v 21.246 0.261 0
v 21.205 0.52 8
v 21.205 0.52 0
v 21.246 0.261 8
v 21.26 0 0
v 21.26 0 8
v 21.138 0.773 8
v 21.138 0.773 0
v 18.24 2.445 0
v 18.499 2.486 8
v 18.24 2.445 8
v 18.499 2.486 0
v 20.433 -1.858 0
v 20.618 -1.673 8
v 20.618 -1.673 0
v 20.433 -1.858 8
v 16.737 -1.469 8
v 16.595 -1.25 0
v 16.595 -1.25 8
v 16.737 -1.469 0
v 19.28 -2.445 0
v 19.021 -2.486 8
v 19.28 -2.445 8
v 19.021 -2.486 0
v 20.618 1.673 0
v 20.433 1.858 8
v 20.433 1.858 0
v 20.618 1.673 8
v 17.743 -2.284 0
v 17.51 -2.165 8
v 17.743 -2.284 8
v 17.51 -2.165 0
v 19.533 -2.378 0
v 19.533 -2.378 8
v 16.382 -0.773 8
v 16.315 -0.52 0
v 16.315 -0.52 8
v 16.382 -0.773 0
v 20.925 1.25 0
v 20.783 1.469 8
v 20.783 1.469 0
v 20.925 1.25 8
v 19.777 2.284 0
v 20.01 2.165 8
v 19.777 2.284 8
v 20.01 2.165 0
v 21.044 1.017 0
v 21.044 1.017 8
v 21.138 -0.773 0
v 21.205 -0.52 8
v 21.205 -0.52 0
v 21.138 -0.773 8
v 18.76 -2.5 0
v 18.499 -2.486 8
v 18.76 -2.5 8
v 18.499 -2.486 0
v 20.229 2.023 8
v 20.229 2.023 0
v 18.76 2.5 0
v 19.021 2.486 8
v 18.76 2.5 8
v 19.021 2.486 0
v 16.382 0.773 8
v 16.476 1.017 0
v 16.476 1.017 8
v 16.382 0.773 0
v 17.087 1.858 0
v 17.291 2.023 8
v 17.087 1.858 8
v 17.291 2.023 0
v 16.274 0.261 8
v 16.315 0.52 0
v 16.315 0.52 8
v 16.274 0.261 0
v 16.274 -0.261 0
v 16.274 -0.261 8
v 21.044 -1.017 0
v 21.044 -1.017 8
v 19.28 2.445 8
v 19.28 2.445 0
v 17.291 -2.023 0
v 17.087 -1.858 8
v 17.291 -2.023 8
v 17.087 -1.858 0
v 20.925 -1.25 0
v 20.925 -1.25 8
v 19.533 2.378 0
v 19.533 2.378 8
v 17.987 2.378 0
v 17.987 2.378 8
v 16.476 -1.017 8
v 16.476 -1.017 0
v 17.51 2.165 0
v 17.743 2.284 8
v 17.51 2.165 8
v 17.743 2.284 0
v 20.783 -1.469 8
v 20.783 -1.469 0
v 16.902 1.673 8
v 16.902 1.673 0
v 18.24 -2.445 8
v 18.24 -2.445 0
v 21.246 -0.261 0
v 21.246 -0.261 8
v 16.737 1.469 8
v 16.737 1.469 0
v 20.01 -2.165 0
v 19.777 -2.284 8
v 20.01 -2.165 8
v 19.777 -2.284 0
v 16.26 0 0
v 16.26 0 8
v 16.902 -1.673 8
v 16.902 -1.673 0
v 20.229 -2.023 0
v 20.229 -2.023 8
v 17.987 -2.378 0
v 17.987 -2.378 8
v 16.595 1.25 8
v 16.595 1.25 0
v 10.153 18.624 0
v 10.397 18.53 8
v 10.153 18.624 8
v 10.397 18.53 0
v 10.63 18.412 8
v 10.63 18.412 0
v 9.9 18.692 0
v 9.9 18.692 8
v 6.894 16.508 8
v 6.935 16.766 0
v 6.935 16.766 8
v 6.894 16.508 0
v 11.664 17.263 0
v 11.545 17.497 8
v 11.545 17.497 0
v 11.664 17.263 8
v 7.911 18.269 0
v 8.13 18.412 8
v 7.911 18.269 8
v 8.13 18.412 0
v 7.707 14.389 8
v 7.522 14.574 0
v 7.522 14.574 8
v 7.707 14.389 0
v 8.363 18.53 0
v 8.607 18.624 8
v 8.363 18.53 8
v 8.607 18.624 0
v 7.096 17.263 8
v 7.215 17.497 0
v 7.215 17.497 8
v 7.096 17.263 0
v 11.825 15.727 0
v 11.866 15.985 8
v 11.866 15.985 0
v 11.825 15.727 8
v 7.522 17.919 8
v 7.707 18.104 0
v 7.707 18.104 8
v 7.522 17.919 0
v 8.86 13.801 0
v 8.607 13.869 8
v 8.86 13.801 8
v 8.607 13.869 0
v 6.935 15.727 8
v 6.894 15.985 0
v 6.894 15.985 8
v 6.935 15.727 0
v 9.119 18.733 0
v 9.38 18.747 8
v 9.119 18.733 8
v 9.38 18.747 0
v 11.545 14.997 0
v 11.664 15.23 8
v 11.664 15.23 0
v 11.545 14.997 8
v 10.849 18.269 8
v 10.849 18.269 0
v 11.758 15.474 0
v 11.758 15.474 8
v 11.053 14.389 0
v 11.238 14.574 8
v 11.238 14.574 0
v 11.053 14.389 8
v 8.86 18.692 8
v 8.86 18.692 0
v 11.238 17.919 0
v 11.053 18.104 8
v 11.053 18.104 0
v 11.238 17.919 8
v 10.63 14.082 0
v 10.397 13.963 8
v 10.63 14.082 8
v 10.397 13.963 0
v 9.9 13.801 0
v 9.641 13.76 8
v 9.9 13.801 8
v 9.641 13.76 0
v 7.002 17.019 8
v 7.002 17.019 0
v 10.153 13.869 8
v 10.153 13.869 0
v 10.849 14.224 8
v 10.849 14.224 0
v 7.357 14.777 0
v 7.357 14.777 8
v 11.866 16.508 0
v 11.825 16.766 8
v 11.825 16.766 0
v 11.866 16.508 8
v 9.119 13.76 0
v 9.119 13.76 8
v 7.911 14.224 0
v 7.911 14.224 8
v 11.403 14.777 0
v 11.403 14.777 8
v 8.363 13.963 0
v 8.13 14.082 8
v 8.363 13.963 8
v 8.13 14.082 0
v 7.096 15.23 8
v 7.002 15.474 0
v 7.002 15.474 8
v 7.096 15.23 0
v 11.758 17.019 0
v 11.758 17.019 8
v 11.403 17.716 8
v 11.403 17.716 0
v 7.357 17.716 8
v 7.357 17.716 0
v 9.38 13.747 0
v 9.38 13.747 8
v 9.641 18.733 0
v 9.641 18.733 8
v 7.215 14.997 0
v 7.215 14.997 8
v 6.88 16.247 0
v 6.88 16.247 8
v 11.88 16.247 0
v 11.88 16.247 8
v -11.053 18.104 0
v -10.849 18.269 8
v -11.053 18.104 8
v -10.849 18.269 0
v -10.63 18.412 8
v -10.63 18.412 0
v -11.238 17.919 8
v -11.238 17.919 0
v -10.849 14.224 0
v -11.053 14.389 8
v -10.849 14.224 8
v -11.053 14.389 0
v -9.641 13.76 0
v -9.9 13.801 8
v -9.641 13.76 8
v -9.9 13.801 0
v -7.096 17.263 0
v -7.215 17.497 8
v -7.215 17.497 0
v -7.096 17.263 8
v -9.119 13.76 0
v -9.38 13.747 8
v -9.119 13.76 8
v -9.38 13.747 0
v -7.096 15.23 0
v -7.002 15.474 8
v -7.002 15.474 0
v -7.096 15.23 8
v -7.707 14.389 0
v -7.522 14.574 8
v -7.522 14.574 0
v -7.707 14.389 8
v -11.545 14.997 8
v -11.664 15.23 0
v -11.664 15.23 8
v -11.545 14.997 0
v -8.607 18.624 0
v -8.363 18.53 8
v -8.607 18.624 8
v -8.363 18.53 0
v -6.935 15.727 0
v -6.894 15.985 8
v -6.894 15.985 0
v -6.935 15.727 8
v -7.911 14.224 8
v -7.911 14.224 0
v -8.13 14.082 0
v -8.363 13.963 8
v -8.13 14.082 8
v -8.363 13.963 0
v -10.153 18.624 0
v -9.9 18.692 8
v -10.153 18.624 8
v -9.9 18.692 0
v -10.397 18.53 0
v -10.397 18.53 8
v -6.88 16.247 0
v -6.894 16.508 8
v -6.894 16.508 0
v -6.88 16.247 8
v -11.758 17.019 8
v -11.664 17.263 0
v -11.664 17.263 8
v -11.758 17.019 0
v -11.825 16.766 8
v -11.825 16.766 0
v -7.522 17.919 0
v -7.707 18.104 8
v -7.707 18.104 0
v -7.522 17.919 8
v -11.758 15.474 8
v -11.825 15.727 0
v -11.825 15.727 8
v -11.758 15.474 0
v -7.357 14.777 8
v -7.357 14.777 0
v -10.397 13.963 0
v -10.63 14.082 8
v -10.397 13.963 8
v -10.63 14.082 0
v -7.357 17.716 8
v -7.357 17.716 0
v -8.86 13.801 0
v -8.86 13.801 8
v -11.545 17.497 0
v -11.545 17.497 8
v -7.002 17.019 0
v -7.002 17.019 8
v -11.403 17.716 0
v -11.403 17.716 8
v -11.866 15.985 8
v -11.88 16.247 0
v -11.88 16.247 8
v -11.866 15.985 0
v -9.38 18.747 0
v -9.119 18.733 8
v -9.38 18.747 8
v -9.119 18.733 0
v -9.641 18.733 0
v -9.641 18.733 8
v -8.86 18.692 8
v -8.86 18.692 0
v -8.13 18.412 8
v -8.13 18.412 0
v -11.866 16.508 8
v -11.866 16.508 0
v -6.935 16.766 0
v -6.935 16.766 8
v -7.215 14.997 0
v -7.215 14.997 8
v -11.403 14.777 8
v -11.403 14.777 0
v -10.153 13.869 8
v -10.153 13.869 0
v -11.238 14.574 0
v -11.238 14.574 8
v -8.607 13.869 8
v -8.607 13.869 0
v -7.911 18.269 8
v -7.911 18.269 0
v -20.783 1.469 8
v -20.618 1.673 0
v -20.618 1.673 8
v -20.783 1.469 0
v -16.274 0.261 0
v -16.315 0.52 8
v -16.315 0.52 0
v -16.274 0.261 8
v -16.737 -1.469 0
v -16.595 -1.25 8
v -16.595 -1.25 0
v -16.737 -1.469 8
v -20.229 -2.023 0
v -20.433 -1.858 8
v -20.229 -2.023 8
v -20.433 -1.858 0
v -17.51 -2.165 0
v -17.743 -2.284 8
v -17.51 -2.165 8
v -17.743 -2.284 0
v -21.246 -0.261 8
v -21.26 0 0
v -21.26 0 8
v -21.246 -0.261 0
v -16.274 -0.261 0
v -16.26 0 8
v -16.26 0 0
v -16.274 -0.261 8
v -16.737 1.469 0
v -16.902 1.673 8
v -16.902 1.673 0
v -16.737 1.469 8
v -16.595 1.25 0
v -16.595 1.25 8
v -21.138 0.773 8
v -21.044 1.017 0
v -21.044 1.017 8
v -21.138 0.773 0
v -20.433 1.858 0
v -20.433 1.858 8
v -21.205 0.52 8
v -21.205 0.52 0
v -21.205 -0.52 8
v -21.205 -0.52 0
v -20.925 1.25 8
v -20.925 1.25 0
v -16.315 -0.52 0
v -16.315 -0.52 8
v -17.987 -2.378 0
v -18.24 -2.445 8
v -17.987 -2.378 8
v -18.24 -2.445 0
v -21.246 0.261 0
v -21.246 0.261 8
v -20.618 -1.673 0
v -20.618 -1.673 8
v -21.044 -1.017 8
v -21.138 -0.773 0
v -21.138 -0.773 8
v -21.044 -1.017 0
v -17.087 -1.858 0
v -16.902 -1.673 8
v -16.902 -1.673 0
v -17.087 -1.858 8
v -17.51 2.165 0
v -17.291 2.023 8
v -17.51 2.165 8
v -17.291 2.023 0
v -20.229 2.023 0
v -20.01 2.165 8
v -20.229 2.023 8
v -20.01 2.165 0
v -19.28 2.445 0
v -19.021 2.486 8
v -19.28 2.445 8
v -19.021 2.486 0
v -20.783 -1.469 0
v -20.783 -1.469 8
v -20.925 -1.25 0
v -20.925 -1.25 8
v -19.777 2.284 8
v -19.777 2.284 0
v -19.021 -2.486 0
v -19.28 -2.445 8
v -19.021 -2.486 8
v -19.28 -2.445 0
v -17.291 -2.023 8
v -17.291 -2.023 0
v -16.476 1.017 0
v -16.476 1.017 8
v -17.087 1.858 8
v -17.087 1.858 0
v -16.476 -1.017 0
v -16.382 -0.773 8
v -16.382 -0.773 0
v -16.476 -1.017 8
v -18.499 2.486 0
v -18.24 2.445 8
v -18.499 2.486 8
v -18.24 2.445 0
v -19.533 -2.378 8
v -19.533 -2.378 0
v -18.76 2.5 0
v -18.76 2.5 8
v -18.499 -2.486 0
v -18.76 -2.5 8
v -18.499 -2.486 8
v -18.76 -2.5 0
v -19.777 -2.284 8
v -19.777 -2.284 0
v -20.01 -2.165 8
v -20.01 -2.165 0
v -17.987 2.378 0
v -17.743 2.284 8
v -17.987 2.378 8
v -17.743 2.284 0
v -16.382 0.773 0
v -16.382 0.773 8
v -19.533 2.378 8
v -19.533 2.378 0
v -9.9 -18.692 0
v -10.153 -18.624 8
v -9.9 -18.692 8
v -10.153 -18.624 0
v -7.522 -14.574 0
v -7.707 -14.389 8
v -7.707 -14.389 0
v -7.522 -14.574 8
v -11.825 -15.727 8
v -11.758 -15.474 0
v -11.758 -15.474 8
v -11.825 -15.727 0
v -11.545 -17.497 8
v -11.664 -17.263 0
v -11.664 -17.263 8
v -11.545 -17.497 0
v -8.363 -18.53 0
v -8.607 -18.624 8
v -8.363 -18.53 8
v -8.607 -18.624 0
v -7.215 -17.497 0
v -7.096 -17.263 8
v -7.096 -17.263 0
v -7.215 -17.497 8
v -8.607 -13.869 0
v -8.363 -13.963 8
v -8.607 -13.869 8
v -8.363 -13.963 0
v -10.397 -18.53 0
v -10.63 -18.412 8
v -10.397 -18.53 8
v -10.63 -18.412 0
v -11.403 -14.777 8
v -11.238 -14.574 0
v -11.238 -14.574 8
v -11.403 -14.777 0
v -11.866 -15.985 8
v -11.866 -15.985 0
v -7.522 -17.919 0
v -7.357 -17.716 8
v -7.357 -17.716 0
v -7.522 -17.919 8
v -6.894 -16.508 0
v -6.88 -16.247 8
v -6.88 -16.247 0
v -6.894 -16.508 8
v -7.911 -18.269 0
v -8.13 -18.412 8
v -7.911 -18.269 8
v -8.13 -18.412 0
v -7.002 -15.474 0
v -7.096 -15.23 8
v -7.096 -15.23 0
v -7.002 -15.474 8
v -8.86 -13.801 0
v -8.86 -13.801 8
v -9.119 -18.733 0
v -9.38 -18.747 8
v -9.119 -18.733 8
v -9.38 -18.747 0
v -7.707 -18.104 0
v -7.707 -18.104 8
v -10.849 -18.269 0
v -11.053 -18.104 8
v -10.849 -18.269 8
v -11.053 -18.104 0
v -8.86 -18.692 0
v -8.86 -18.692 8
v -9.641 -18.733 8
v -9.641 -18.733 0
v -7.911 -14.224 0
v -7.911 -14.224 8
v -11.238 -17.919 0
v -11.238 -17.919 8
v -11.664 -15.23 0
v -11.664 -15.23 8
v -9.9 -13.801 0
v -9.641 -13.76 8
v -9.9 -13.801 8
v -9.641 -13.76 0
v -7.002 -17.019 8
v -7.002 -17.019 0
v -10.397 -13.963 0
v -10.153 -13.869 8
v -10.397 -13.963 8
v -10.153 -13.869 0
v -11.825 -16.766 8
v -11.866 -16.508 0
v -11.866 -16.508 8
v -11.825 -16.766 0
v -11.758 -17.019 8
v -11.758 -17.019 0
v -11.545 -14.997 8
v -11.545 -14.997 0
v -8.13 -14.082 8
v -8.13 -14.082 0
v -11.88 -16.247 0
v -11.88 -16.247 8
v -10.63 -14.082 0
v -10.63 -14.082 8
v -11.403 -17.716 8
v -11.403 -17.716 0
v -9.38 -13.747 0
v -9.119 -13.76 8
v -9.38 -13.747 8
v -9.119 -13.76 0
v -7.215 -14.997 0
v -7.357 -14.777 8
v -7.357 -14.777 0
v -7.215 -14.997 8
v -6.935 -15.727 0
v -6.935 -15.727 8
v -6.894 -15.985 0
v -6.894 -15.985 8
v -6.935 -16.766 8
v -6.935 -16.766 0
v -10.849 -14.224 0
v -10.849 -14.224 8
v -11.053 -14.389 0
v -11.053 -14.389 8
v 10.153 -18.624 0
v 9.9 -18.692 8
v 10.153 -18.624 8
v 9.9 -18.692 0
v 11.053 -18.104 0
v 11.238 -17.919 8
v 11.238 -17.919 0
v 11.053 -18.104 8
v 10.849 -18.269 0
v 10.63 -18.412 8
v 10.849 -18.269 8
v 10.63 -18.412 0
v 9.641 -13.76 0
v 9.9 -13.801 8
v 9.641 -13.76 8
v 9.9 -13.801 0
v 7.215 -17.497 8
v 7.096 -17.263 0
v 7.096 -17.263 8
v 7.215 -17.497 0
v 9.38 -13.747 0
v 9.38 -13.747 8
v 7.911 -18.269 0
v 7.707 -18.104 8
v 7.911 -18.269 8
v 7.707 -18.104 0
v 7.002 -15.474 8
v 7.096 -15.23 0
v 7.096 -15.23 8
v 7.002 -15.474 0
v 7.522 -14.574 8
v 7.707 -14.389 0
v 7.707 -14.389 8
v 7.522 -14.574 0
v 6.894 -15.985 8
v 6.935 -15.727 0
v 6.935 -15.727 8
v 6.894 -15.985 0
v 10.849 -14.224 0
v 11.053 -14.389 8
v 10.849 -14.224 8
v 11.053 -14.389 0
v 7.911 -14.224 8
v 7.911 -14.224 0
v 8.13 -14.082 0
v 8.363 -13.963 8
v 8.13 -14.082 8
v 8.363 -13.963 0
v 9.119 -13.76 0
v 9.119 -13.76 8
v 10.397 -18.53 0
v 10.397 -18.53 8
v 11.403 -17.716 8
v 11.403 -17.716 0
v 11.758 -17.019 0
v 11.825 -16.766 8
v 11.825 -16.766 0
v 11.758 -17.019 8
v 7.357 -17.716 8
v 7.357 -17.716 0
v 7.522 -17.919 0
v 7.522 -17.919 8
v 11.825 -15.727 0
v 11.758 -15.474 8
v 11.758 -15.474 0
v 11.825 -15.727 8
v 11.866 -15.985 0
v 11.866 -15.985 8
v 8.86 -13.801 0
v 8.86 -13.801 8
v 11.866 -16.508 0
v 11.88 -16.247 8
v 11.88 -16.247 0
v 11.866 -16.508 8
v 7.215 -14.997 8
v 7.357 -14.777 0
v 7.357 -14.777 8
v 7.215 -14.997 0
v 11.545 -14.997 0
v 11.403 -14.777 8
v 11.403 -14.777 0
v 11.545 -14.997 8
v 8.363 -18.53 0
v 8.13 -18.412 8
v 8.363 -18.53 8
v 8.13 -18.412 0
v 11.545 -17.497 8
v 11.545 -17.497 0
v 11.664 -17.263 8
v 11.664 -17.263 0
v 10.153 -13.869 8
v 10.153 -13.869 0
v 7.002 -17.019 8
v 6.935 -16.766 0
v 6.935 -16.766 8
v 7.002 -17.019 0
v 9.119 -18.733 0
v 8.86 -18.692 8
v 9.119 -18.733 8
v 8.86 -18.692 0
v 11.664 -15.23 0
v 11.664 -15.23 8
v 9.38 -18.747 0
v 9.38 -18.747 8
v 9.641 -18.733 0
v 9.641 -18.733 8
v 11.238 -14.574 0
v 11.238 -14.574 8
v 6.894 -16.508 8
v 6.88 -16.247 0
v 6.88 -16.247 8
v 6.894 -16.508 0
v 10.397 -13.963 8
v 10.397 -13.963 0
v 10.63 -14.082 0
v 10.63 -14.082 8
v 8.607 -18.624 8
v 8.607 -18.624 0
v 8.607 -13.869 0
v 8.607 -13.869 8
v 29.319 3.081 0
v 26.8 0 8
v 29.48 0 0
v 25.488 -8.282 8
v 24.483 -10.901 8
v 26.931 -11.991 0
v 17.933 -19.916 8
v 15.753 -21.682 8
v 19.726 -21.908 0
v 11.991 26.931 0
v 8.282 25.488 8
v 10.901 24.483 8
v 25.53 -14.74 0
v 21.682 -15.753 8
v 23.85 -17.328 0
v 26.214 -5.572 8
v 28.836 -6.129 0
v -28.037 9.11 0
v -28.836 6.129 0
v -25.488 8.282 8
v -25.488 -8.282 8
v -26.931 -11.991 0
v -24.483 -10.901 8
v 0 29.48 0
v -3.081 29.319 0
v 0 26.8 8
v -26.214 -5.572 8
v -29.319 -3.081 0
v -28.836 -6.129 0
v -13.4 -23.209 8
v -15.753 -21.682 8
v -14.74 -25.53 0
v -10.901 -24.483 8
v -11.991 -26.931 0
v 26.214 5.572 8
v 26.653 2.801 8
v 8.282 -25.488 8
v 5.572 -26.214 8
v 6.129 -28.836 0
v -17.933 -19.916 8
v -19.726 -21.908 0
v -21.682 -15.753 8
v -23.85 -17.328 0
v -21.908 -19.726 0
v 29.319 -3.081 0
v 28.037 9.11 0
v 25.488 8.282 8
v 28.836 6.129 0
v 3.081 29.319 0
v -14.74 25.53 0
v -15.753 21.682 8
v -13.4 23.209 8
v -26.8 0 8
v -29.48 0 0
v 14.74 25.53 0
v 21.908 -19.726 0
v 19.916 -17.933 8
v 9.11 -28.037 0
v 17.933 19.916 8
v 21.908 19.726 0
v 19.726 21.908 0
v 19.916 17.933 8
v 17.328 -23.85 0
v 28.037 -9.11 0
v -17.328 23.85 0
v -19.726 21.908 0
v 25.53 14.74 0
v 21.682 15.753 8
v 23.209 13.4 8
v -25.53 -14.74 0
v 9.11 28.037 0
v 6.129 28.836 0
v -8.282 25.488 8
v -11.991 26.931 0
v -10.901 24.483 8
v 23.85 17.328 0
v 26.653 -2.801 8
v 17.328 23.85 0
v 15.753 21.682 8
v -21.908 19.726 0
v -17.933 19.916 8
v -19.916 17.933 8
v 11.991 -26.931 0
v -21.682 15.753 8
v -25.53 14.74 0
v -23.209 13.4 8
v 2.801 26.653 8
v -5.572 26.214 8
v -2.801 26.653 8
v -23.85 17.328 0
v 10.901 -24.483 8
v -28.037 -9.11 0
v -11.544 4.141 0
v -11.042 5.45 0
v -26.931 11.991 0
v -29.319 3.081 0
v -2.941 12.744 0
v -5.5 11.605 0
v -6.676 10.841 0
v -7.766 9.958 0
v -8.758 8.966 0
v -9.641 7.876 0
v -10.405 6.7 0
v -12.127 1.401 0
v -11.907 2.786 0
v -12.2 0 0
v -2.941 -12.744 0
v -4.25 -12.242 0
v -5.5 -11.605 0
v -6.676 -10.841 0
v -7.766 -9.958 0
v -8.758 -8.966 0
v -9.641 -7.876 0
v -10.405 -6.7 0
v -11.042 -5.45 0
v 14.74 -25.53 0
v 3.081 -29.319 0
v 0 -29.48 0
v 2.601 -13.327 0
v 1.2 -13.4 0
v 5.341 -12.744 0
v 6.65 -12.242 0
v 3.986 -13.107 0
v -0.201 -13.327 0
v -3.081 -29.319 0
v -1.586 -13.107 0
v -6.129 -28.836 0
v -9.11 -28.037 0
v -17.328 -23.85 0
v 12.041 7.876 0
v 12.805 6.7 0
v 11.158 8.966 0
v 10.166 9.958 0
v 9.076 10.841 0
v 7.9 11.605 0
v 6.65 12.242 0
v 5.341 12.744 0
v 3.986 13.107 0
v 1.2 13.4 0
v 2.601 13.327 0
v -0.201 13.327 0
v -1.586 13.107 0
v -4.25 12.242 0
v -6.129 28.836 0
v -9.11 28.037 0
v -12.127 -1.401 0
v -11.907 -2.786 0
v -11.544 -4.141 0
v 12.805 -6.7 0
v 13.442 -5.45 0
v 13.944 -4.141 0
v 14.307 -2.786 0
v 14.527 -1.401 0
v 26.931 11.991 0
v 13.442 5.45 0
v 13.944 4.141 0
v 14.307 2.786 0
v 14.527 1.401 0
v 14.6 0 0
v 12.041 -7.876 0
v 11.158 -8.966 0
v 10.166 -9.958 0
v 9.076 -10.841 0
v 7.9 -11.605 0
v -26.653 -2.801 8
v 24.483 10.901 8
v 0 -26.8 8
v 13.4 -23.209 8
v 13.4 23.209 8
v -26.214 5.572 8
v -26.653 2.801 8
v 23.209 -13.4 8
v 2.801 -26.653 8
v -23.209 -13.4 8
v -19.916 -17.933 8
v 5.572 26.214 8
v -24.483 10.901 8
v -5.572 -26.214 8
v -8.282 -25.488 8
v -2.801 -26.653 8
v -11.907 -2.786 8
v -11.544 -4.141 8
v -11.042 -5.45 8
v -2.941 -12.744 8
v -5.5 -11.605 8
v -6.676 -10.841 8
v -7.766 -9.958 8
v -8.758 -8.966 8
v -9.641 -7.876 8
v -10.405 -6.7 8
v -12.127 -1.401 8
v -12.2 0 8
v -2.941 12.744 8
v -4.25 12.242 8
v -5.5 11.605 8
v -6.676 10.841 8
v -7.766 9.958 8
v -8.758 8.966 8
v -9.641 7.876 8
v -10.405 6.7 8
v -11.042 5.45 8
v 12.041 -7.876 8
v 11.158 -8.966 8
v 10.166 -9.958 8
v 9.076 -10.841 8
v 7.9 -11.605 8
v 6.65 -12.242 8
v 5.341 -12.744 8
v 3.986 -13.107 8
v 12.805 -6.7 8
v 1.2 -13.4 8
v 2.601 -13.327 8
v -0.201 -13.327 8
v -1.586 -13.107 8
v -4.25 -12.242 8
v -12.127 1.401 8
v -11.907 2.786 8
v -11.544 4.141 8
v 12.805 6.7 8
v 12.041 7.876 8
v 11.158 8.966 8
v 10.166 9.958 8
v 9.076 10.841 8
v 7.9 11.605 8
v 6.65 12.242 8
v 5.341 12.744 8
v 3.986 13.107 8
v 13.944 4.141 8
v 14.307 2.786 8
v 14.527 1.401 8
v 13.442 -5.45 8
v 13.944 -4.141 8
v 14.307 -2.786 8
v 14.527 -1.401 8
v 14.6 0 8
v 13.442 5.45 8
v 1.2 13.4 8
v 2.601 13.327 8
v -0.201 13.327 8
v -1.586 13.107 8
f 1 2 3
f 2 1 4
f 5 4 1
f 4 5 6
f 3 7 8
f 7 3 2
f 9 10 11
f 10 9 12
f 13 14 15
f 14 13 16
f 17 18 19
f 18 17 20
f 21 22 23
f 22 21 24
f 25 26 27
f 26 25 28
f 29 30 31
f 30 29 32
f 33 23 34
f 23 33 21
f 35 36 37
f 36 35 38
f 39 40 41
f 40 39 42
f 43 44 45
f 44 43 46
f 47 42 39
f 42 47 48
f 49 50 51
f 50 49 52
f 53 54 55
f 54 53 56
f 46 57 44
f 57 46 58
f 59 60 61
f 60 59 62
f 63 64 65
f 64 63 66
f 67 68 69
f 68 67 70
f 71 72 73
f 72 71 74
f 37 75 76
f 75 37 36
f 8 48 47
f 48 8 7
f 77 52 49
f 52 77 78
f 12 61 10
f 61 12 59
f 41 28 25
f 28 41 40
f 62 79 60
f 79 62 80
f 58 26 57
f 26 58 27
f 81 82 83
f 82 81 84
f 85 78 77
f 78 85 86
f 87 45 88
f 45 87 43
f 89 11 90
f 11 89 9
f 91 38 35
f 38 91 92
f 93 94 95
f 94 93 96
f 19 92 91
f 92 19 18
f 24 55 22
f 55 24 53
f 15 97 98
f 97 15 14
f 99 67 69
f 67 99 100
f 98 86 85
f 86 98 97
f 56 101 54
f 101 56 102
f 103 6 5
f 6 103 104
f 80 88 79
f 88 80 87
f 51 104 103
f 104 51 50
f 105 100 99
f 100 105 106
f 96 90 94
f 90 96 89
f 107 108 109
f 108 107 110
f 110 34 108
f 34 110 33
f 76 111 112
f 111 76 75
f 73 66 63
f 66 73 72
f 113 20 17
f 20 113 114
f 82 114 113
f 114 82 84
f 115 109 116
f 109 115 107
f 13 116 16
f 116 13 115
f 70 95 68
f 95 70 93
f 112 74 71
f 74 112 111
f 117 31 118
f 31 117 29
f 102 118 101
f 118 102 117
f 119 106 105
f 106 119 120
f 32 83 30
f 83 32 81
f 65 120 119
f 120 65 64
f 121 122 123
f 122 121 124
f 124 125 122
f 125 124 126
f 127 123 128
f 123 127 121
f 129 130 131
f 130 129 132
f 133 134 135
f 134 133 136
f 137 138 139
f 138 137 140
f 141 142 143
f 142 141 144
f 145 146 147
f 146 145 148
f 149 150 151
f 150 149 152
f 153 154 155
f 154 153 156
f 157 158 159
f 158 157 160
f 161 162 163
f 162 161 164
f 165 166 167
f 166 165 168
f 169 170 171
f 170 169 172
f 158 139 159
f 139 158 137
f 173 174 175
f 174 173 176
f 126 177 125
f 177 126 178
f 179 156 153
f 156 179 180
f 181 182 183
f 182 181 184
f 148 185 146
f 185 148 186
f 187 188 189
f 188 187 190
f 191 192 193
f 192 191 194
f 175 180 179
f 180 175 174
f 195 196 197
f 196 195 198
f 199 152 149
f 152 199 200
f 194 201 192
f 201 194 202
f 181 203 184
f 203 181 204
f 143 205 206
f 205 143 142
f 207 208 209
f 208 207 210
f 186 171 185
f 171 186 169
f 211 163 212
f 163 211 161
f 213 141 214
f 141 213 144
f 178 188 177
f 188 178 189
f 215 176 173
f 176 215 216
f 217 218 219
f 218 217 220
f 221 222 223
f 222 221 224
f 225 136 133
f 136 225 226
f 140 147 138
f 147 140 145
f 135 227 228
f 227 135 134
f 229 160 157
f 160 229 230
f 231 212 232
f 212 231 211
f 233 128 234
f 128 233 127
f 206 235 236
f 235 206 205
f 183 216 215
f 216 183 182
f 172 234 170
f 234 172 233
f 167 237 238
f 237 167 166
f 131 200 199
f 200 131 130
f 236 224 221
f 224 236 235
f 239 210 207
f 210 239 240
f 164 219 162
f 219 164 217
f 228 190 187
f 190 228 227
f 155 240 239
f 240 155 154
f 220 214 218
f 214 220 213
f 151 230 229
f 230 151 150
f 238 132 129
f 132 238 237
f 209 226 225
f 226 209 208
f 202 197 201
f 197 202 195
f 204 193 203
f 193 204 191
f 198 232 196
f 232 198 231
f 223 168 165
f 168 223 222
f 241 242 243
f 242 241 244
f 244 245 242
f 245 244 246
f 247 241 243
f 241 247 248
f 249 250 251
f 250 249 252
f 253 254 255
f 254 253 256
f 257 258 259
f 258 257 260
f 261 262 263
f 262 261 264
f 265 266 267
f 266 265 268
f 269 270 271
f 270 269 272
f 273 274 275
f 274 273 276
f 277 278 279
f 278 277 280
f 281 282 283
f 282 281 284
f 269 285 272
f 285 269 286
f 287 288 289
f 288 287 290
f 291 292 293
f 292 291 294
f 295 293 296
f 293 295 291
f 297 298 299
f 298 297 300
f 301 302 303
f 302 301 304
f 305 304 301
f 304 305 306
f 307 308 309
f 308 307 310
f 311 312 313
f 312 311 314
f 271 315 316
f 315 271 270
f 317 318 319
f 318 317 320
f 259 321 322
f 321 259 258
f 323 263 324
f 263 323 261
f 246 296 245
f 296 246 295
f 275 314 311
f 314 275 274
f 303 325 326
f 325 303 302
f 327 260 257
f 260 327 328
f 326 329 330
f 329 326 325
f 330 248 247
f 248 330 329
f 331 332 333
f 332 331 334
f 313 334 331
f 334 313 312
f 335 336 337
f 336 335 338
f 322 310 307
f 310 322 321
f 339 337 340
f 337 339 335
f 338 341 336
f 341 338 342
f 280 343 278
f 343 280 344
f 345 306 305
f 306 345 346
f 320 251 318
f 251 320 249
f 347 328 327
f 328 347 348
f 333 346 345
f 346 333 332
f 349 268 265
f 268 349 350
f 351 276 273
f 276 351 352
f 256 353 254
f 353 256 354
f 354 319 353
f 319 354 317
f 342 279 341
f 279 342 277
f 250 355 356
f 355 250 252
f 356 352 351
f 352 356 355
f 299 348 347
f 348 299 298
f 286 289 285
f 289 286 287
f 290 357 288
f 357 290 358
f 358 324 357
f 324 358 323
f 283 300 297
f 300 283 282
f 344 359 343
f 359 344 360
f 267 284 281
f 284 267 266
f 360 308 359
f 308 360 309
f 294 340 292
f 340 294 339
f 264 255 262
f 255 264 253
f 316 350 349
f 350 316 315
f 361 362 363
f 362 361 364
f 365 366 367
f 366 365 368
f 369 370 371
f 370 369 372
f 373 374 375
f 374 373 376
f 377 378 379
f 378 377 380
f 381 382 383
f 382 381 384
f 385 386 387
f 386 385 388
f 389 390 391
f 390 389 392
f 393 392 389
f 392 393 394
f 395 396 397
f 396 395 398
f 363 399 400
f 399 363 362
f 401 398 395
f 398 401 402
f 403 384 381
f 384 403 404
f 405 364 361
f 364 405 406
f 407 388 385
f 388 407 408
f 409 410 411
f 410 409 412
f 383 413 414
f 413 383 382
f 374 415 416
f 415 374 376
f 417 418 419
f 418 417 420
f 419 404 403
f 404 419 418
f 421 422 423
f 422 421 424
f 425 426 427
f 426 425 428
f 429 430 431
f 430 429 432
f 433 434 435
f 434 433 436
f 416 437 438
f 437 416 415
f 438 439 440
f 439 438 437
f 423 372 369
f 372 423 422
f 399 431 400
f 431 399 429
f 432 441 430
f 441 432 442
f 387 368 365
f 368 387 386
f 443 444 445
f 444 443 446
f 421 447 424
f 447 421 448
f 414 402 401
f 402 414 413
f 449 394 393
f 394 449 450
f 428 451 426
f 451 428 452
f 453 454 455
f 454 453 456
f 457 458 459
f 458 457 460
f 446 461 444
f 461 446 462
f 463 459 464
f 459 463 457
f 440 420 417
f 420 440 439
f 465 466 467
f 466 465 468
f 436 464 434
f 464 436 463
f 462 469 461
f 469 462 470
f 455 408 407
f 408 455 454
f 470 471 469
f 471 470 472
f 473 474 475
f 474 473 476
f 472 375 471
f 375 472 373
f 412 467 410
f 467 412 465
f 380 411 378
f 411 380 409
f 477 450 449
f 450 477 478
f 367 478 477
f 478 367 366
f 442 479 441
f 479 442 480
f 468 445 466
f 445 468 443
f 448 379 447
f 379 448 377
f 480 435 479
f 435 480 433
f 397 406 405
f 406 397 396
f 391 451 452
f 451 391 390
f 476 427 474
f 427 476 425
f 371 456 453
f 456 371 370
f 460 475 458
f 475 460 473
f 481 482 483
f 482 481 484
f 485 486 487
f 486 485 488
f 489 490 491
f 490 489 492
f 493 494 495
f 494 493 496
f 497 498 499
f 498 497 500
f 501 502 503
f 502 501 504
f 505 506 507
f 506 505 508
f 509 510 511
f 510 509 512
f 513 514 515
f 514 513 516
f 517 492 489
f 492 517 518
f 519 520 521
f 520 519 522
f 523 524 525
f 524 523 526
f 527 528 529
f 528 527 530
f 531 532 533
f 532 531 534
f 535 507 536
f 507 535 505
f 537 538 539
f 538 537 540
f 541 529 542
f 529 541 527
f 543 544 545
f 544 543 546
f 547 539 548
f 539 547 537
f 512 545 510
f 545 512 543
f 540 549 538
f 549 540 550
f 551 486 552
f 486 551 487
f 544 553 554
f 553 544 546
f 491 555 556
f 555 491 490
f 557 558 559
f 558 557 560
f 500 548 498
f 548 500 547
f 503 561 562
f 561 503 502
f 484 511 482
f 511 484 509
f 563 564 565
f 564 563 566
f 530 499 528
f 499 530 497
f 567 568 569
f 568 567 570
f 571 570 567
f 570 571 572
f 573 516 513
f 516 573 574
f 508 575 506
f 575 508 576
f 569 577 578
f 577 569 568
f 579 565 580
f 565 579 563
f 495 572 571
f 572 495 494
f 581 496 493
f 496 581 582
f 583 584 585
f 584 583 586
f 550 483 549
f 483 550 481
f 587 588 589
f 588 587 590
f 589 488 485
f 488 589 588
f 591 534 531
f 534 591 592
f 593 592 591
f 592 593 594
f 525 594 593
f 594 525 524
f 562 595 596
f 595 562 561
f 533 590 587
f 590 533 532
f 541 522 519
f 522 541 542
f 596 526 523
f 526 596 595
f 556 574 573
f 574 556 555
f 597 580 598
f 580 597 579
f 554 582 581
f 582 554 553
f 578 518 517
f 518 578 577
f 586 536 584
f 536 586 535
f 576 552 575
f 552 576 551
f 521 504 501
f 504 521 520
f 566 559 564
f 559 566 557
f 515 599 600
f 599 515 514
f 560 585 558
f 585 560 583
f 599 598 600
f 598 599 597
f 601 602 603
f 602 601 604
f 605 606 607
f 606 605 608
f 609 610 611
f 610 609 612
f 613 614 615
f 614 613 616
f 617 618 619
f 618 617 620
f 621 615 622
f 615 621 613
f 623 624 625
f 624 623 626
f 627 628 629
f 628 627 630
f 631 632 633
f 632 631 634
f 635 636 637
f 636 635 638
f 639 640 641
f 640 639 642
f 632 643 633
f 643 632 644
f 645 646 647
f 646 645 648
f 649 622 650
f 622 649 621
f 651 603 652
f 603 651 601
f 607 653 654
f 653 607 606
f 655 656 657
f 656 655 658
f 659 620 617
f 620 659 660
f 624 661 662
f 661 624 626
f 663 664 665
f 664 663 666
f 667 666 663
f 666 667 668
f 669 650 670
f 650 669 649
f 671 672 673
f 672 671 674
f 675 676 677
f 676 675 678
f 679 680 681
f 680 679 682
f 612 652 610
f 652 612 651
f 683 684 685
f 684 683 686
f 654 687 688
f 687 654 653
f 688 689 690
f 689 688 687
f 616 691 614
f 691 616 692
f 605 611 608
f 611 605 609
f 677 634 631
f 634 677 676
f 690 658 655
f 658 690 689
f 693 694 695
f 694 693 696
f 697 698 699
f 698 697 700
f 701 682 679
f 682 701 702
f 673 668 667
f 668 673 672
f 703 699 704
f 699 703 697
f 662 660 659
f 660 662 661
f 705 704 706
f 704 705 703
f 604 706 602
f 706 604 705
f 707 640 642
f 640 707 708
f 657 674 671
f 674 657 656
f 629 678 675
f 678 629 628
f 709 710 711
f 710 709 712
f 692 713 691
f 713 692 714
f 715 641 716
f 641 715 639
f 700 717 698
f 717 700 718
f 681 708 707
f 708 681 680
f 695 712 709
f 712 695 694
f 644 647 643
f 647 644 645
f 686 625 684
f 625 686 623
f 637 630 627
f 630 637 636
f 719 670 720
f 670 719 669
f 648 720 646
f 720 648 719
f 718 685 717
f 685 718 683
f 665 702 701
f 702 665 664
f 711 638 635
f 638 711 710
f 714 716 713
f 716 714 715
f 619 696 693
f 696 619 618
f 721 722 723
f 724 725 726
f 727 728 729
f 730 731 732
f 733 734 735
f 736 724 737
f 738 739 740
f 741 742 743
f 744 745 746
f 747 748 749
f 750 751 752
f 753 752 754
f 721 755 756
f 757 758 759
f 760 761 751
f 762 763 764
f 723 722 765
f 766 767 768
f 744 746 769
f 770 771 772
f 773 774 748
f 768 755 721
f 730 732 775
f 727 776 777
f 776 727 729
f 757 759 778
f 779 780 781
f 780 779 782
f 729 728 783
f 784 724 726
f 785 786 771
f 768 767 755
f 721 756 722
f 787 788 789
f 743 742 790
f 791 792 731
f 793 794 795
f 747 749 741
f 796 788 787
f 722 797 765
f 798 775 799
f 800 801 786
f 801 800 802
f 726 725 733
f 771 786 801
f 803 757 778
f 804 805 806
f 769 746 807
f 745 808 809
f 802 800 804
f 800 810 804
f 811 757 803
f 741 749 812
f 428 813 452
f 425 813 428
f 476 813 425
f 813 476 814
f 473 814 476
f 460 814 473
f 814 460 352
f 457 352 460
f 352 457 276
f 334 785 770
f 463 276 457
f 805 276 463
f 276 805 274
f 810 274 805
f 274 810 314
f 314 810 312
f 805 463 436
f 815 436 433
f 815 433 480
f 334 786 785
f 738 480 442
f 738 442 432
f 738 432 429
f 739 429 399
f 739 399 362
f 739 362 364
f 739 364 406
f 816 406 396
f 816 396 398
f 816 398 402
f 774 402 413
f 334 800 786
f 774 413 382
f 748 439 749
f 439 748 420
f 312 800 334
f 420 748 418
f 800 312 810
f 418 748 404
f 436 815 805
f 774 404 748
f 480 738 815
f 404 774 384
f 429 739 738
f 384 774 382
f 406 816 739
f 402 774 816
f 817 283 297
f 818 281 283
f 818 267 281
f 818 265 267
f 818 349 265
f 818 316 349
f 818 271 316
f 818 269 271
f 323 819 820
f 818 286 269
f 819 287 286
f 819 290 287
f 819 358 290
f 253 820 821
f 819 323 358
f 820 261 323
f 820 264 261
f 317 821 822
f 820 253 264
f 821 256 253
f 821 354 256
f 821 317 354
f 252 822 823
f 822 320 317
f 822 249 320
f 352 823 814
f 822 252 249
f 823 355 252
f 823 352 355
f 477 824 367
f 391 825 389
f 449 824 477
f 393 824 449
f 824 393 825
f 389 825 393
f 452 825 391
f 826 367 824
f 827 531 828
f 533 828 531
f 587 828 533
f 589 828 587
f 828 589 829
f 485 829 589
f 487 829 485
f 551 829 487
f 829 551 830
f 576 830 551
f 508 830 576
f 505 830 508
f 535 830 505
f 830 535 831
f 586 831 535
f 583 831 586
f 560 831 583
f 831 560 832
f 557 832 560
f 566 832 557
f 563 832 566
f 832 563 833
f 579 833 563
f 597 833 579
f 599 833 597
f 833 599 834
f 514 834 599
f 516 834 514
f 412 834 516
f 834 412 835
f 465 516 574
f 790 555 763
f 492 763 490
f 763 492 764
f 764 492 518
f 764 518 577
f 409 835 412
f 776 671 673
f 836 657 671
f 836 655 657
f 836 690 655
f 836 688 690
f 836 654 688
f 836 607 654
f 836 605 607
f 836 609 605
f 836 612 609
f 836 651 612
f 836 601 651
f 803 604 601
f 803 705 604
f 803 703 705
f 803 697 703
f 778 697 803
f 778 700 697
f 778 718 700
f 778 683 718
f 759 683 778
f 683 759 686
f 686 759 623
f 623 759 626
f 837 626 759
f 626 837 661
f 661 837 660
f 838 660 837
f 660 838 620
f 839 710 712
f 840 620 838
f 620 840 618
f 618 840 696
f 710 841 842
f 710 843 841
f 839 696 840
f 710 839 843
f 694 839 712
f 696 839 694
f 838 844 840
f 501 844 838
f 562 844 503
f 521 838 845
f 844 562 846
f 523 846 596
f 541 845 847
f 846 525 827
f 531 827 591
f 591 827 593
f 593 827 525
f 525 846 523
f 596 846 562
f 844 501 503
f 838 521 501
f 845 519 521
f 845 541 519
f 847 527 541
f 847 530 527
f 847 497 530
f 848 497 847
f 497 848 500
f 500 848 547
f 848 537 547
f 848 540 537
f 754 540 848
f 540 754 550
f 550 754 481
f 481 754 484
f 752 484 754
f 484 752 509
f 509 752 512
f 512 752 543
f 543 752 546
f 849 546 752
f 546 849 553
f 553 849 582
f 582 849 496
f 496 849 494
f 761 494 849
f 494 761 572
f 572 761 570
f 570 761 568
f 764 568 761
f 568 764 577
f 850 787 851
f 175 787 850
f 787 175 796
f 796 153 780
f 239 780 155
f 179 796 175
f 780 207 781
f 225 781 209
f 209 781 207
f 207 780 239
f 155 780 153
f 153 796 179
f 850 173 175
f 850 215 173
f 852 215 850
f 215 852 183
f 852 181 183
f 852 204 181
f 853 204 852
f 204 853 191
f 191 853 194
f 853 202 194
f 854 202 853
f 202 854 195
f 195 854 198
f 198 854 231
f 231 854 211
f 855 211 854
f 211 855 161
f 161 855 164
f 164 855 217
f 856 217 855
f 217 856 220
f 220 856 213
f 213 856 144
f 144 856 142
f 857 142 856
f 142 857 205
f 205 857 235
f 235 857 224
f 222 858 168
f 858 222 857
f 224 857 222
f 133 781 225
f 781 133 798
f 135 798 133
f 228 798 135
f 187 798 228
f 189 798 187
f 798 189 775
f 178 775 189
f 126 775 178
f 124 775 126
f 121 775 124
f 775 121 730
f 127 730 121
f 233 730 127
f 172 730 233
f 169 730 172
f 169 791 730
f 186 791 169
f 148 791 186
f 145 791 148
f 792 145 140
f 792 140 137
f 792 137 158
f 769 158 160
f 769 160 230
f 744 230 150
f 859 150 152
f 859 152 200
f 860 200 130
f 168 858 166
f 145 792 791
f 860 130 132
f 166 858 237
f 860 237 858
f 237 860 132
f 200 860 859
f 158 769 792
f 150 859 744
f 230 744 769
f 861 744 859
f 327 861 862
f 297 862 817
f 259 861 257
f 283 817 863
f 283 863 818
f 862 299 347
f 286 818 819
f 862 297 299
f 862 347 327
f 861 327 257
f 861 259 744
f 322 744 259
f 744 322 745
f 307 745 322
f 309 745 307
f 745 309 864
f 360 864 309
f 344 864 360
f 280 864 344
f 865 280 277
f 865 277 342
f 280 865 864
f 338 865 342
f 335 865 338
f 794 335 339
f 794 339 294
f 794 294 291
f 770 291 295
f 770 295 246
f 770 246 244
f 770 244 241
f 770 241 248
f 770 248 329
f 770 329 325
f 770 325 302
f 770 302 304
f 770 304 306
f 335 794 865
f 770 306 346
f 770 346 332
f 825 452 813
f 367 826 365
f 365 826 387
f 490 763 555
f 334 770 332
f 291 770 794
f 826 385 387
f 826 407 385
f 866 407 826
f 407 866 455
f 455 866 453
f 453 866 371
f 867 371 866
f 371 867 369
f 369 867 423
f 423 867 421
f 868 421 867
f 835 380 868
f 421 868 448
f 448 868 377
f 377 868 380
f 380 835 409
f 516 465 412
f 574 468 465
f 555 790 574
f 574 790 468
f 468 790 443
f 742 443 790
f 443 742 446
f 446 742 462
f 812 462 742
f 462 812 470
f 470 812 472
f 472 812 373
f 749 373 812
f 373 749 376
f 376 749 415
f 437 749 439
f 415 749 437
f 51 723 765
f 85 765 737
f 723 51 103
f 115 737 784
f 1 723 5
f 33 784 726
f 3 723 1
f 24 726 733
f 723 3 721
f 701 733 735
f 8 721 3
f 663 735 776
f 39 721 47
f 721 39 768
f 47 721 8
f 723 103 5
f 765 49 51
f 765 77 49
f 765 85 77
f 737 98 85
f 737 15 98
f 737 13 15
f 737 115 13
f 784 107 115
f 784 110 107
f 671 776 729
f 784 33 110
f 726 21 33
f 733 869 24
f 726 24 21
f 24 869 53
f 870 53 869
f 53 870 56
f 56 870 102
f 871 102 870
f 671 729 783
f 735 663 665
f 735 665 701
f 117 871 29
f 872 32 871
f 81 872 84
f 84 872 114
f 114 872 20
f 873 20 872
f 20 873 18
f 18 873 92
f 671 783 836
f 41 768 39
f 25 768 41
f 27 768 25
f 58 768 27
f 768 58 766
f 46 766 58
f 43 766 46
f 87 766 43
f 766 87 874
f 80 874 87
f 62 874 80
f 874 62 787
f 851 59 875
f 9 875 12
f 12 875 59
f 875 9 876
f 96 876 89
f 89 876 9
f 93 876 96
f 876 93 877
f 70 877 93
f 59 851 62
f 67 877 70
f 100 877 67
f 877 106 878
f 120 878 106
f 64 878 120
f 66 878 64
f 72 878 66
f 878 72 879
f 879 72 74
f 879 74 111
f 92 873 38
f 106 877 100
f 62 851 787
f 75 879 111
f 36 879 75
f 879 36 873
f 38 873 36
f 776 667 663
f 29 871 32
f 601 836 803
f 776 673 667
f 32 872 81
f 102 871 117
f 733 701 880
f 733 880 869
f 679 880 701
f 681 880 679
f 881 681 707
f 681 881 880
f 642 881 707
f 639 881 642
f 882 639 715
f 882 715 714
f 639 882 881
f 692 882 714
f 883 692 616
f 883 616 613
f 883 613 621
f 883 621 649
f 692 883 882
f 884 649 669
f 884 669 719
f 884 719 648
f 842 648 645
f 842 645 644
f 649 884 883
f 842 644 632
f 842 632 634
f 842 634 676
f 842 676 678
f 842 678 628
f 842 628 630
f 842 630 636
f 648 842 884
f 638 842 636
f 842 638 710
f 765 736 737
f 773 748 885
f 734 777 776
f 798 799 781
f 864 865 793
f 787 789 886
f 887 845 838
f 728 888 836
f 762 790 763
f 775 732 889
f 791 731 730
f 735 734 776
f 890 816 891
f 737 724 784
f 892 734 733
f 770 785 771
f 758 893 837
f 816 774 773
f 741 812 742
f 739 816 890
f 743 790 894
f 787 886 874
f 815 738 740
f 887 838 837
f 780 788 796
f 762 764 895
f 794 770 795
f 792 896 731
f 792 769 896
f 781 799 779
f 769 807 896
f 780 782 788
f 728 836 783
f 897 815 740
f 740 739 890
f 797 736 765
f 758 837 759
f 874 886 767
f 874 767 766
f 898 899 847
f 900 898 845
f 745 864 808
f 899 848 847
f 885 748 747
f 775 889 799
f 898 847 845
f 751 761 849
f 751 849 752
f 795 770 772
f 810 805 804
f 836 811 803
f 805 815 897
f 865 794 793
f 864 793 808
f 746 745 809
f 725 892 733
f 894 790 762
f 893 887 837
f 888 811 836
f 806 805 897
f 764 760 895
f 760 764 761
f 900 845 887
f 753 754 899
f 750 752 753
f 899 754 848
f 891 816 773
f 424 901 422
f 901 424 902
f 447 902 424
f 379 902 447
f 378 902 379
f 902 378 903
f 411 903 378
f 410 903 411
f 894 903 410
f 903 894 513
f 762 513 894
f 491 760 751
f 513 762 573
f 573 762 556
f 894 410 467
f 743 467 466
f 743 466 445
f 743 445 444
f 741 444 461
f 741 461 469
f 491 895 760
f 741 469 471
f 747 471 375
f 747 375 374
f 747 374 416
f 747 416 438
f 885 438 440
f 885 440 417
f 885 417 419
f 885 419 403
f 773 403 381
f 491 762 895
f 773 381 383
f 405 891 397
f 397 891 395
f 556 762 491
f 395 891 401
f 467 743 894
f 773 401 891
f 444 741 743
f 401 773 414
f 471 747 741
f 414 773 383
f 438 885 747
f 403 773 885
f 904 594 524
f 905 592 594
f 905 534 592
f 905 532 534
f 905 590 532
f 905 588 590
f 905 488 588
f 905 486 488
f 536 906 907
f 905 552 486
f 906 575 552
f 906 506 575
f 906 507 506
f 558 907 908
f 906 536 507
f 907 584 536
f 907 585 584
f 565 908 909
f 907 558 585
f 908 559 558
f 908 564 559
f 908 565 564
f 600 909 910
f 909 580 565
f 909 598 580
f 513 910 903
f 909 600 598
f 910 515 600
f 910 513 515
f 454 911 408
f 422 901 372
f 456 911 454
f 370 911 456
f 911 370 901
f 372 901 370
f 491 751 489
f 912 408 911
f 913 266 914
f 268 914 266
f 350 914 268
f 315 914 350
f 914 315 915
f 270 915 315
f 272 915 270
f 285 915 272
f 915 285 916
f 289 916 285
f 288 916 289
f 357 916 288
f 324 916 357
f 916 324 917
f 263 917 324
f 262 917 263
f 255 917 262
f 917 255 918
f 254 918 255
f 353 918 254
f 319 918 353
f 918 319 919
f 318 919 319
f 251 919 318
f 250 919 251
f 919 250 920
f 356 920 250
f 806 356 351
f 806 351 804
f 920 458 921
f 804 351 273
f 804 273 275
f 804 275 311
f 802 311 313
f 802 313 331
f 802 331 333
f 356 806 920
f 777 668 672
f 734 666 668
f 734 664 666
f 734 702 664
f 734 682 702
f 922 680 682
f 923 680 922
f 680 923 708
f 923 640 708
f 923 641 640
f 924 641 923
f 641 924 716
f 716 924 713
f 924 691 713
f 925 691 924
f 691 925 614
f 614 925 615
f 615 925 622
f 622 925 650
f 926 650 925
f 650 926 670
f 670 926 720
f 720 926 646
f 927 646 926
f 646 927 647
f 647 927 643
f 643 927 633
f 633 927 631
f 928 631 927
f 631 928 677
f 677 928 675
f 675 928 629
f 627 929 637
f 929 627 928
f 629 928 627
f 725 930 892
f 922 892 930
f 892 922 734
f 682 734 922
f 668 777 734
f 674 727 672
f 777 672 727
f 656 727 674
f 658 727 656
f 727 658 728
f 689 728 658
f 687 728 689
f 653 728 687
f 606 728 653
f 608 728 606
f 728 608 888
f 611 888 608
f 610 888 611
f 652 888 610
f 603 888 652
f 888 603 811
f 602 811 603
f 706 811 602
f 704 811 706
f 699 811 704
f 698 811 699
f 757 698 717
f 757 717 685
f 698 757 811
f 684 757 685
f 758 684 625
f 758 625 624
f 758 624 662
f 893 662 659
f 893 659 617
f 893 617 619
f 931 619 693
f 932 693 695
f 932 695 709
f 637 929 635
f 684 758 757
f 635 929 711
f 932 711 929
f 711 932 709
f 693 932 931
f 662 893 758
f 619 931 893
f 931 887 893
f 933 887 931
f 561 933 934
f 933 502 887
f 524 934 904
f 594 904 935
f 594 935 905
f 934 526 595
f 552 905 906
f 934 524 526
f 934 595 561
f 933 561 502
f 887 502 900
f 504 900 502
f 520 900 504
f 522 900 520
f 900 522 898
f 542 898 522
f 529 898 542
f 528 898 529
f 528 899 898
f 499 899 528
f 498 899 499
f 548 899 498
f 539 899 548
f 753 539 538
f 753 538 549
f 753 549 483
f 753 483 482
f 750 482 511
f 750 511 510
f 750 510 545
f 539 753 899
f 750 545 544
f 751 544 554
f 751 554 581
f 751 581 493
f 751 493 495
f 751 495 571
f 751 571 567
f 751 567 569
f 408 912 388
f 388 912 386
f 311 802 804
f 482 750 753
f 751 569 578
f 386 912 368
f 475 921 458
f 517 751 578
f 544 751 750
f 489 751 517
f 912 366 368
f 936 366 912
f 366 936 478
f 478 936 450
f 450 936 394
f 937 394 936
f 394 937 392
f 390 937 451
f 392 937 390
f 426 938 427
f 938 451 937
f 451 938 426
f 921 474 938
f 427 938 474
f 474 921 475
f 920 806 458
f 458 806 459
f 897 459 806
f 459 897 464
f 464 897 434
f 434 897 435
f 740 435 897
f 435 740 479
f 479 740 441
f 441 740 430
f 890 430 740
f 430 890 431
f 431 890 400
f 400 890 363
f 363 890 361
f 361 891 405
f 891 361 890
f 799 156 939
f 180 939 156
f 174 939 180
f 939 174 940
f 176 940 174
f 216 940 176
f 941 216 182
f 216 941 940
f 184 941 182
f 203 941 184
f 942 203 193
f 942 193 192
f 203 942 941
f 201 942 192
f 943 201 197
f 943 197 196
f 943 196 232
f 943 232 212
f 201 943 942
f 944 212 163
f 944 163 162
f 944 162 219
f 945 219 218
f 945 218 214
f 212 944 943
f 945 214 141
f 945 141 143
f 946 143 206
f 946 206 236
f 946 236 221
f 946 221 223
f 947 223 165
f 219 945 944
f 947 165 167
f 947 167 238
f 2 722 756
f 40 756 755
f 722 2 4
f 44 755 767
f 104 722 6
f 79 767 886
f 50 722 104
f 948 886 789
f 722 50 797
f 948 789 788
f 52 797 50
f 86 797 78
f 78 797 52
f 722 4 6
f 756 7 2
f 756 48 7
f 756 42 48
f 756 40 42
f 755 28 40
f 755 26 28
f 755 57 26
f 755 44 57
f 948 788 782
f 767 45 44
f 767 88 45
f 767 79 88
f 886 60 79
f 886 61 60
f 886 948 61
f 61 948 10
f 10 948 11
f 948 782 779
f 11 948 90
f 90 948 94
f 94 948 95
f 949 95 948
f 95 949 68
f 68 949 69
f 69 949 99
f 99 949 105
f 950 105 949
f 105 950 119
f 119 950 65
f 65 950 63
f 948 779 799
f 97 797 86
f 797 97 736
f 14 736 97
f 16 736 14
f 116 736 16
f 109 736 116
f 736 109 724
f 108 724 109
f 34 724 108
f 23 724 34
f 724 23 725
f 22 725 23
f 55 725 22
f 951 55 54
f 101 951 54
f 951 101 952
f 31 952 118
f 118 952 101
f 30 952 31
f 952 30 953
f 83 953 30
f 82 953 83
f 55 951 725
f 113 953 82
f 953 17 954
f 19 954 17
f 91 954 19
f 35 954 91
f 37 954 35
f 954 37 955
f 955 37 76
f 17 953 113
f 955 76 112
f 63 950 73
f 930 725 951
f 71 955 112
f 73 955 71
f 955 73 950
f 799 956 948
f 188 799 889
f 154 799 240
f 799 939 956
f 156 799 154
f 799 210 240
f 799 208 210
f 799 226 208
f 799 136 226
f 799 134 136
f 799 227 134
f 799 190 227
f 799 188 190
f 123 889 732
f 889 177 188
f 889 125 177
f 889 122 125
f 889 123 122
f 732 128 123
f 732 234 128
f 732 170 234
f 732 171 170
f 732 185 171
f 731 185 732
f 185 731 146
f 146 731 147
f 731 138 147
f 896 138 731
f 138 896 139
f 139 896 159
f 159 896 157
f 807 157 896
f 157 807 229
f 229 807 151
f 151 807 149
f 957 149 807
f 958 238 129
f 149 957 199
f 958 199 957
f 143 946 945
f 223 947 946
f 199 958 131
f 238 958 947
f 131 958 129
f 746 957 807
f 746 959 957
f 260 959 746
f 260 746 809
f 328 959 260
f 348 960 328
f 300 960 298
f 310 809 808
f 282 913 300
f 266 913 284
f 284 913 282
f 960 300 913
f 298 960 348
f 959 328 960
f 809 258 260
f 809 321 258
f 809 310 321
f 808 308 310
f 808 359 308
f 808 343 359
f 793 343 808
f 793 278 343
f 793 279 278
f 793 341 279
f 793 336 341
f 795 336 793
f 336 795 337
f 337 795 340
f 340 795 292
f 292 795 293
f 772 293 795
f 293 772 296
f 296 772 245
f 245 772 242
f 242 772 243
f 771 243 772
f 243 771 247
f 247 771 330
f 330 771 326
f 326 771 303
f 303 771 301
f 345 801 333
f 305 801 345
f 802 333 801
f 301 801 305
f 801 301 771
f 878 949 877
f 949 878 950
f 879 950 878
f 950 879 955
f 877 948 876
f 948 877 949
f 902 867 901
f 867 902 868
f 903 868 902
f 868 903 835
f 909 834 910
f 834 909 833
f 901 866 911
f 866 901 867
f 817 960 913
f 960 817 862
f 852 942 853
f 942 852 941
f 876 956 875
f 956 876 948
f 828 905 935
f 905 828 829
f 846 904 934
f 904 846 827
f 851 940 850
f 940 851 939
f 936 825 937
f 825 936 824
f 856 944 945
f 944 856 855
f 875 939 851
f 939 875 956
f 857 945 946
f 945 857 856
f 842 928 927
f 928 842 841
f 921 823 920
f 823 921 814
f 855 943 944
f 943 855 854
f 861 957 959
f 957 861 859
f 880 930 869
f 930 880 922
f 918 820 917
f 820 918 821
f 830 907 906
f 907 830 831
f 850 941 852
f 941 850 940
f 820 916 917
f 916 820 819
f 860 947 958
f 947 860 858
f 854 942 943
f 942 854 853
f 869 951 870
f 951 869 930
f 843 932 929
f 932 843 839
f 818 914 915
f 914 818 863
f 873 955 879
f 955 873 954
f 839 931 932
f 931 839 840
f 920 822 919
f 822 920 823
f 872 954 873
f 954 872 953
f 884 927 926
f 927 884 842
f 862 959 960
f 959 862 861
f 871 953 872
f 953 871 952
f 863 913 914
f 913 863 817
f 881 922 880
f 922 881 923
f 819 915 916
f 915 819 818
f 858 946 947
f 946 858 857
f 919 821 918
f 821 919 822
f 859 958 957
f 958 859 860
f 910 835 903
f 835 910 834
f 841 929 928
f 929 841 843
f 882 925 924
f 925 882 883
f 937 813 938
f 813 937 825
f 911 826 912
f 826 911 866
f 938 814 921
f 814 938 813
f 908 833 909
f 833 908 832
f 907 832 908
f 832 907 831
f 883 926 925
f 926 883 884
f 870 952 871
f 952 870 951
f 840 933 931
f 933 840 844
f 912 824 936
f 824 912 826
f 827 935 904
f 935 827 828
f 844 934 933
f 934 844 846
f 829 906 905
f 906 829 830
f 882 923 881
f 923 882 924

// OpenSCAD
$fn=60;

offset=1.2;

module bearing_holder(diameter, height, screw) {
    difference() {
        cylinder(r1=diameter*1.1, r2=diameter*1, h=height);
        translate([offset,0,-.5])
        cylinder(r=diameter/2, h=height+1);
        for(i=[0:5]) {
            rotate(i*60)
                translate([diameter*.7, 0, -.5])
                    cylinder(r=screw, h=height+1);
        }
        
    }
}


bearing_holder(26.8, 8, 2.5);
//translate([76, 0, 0])
 //   bearing_holder(42.2, 14, 3);
